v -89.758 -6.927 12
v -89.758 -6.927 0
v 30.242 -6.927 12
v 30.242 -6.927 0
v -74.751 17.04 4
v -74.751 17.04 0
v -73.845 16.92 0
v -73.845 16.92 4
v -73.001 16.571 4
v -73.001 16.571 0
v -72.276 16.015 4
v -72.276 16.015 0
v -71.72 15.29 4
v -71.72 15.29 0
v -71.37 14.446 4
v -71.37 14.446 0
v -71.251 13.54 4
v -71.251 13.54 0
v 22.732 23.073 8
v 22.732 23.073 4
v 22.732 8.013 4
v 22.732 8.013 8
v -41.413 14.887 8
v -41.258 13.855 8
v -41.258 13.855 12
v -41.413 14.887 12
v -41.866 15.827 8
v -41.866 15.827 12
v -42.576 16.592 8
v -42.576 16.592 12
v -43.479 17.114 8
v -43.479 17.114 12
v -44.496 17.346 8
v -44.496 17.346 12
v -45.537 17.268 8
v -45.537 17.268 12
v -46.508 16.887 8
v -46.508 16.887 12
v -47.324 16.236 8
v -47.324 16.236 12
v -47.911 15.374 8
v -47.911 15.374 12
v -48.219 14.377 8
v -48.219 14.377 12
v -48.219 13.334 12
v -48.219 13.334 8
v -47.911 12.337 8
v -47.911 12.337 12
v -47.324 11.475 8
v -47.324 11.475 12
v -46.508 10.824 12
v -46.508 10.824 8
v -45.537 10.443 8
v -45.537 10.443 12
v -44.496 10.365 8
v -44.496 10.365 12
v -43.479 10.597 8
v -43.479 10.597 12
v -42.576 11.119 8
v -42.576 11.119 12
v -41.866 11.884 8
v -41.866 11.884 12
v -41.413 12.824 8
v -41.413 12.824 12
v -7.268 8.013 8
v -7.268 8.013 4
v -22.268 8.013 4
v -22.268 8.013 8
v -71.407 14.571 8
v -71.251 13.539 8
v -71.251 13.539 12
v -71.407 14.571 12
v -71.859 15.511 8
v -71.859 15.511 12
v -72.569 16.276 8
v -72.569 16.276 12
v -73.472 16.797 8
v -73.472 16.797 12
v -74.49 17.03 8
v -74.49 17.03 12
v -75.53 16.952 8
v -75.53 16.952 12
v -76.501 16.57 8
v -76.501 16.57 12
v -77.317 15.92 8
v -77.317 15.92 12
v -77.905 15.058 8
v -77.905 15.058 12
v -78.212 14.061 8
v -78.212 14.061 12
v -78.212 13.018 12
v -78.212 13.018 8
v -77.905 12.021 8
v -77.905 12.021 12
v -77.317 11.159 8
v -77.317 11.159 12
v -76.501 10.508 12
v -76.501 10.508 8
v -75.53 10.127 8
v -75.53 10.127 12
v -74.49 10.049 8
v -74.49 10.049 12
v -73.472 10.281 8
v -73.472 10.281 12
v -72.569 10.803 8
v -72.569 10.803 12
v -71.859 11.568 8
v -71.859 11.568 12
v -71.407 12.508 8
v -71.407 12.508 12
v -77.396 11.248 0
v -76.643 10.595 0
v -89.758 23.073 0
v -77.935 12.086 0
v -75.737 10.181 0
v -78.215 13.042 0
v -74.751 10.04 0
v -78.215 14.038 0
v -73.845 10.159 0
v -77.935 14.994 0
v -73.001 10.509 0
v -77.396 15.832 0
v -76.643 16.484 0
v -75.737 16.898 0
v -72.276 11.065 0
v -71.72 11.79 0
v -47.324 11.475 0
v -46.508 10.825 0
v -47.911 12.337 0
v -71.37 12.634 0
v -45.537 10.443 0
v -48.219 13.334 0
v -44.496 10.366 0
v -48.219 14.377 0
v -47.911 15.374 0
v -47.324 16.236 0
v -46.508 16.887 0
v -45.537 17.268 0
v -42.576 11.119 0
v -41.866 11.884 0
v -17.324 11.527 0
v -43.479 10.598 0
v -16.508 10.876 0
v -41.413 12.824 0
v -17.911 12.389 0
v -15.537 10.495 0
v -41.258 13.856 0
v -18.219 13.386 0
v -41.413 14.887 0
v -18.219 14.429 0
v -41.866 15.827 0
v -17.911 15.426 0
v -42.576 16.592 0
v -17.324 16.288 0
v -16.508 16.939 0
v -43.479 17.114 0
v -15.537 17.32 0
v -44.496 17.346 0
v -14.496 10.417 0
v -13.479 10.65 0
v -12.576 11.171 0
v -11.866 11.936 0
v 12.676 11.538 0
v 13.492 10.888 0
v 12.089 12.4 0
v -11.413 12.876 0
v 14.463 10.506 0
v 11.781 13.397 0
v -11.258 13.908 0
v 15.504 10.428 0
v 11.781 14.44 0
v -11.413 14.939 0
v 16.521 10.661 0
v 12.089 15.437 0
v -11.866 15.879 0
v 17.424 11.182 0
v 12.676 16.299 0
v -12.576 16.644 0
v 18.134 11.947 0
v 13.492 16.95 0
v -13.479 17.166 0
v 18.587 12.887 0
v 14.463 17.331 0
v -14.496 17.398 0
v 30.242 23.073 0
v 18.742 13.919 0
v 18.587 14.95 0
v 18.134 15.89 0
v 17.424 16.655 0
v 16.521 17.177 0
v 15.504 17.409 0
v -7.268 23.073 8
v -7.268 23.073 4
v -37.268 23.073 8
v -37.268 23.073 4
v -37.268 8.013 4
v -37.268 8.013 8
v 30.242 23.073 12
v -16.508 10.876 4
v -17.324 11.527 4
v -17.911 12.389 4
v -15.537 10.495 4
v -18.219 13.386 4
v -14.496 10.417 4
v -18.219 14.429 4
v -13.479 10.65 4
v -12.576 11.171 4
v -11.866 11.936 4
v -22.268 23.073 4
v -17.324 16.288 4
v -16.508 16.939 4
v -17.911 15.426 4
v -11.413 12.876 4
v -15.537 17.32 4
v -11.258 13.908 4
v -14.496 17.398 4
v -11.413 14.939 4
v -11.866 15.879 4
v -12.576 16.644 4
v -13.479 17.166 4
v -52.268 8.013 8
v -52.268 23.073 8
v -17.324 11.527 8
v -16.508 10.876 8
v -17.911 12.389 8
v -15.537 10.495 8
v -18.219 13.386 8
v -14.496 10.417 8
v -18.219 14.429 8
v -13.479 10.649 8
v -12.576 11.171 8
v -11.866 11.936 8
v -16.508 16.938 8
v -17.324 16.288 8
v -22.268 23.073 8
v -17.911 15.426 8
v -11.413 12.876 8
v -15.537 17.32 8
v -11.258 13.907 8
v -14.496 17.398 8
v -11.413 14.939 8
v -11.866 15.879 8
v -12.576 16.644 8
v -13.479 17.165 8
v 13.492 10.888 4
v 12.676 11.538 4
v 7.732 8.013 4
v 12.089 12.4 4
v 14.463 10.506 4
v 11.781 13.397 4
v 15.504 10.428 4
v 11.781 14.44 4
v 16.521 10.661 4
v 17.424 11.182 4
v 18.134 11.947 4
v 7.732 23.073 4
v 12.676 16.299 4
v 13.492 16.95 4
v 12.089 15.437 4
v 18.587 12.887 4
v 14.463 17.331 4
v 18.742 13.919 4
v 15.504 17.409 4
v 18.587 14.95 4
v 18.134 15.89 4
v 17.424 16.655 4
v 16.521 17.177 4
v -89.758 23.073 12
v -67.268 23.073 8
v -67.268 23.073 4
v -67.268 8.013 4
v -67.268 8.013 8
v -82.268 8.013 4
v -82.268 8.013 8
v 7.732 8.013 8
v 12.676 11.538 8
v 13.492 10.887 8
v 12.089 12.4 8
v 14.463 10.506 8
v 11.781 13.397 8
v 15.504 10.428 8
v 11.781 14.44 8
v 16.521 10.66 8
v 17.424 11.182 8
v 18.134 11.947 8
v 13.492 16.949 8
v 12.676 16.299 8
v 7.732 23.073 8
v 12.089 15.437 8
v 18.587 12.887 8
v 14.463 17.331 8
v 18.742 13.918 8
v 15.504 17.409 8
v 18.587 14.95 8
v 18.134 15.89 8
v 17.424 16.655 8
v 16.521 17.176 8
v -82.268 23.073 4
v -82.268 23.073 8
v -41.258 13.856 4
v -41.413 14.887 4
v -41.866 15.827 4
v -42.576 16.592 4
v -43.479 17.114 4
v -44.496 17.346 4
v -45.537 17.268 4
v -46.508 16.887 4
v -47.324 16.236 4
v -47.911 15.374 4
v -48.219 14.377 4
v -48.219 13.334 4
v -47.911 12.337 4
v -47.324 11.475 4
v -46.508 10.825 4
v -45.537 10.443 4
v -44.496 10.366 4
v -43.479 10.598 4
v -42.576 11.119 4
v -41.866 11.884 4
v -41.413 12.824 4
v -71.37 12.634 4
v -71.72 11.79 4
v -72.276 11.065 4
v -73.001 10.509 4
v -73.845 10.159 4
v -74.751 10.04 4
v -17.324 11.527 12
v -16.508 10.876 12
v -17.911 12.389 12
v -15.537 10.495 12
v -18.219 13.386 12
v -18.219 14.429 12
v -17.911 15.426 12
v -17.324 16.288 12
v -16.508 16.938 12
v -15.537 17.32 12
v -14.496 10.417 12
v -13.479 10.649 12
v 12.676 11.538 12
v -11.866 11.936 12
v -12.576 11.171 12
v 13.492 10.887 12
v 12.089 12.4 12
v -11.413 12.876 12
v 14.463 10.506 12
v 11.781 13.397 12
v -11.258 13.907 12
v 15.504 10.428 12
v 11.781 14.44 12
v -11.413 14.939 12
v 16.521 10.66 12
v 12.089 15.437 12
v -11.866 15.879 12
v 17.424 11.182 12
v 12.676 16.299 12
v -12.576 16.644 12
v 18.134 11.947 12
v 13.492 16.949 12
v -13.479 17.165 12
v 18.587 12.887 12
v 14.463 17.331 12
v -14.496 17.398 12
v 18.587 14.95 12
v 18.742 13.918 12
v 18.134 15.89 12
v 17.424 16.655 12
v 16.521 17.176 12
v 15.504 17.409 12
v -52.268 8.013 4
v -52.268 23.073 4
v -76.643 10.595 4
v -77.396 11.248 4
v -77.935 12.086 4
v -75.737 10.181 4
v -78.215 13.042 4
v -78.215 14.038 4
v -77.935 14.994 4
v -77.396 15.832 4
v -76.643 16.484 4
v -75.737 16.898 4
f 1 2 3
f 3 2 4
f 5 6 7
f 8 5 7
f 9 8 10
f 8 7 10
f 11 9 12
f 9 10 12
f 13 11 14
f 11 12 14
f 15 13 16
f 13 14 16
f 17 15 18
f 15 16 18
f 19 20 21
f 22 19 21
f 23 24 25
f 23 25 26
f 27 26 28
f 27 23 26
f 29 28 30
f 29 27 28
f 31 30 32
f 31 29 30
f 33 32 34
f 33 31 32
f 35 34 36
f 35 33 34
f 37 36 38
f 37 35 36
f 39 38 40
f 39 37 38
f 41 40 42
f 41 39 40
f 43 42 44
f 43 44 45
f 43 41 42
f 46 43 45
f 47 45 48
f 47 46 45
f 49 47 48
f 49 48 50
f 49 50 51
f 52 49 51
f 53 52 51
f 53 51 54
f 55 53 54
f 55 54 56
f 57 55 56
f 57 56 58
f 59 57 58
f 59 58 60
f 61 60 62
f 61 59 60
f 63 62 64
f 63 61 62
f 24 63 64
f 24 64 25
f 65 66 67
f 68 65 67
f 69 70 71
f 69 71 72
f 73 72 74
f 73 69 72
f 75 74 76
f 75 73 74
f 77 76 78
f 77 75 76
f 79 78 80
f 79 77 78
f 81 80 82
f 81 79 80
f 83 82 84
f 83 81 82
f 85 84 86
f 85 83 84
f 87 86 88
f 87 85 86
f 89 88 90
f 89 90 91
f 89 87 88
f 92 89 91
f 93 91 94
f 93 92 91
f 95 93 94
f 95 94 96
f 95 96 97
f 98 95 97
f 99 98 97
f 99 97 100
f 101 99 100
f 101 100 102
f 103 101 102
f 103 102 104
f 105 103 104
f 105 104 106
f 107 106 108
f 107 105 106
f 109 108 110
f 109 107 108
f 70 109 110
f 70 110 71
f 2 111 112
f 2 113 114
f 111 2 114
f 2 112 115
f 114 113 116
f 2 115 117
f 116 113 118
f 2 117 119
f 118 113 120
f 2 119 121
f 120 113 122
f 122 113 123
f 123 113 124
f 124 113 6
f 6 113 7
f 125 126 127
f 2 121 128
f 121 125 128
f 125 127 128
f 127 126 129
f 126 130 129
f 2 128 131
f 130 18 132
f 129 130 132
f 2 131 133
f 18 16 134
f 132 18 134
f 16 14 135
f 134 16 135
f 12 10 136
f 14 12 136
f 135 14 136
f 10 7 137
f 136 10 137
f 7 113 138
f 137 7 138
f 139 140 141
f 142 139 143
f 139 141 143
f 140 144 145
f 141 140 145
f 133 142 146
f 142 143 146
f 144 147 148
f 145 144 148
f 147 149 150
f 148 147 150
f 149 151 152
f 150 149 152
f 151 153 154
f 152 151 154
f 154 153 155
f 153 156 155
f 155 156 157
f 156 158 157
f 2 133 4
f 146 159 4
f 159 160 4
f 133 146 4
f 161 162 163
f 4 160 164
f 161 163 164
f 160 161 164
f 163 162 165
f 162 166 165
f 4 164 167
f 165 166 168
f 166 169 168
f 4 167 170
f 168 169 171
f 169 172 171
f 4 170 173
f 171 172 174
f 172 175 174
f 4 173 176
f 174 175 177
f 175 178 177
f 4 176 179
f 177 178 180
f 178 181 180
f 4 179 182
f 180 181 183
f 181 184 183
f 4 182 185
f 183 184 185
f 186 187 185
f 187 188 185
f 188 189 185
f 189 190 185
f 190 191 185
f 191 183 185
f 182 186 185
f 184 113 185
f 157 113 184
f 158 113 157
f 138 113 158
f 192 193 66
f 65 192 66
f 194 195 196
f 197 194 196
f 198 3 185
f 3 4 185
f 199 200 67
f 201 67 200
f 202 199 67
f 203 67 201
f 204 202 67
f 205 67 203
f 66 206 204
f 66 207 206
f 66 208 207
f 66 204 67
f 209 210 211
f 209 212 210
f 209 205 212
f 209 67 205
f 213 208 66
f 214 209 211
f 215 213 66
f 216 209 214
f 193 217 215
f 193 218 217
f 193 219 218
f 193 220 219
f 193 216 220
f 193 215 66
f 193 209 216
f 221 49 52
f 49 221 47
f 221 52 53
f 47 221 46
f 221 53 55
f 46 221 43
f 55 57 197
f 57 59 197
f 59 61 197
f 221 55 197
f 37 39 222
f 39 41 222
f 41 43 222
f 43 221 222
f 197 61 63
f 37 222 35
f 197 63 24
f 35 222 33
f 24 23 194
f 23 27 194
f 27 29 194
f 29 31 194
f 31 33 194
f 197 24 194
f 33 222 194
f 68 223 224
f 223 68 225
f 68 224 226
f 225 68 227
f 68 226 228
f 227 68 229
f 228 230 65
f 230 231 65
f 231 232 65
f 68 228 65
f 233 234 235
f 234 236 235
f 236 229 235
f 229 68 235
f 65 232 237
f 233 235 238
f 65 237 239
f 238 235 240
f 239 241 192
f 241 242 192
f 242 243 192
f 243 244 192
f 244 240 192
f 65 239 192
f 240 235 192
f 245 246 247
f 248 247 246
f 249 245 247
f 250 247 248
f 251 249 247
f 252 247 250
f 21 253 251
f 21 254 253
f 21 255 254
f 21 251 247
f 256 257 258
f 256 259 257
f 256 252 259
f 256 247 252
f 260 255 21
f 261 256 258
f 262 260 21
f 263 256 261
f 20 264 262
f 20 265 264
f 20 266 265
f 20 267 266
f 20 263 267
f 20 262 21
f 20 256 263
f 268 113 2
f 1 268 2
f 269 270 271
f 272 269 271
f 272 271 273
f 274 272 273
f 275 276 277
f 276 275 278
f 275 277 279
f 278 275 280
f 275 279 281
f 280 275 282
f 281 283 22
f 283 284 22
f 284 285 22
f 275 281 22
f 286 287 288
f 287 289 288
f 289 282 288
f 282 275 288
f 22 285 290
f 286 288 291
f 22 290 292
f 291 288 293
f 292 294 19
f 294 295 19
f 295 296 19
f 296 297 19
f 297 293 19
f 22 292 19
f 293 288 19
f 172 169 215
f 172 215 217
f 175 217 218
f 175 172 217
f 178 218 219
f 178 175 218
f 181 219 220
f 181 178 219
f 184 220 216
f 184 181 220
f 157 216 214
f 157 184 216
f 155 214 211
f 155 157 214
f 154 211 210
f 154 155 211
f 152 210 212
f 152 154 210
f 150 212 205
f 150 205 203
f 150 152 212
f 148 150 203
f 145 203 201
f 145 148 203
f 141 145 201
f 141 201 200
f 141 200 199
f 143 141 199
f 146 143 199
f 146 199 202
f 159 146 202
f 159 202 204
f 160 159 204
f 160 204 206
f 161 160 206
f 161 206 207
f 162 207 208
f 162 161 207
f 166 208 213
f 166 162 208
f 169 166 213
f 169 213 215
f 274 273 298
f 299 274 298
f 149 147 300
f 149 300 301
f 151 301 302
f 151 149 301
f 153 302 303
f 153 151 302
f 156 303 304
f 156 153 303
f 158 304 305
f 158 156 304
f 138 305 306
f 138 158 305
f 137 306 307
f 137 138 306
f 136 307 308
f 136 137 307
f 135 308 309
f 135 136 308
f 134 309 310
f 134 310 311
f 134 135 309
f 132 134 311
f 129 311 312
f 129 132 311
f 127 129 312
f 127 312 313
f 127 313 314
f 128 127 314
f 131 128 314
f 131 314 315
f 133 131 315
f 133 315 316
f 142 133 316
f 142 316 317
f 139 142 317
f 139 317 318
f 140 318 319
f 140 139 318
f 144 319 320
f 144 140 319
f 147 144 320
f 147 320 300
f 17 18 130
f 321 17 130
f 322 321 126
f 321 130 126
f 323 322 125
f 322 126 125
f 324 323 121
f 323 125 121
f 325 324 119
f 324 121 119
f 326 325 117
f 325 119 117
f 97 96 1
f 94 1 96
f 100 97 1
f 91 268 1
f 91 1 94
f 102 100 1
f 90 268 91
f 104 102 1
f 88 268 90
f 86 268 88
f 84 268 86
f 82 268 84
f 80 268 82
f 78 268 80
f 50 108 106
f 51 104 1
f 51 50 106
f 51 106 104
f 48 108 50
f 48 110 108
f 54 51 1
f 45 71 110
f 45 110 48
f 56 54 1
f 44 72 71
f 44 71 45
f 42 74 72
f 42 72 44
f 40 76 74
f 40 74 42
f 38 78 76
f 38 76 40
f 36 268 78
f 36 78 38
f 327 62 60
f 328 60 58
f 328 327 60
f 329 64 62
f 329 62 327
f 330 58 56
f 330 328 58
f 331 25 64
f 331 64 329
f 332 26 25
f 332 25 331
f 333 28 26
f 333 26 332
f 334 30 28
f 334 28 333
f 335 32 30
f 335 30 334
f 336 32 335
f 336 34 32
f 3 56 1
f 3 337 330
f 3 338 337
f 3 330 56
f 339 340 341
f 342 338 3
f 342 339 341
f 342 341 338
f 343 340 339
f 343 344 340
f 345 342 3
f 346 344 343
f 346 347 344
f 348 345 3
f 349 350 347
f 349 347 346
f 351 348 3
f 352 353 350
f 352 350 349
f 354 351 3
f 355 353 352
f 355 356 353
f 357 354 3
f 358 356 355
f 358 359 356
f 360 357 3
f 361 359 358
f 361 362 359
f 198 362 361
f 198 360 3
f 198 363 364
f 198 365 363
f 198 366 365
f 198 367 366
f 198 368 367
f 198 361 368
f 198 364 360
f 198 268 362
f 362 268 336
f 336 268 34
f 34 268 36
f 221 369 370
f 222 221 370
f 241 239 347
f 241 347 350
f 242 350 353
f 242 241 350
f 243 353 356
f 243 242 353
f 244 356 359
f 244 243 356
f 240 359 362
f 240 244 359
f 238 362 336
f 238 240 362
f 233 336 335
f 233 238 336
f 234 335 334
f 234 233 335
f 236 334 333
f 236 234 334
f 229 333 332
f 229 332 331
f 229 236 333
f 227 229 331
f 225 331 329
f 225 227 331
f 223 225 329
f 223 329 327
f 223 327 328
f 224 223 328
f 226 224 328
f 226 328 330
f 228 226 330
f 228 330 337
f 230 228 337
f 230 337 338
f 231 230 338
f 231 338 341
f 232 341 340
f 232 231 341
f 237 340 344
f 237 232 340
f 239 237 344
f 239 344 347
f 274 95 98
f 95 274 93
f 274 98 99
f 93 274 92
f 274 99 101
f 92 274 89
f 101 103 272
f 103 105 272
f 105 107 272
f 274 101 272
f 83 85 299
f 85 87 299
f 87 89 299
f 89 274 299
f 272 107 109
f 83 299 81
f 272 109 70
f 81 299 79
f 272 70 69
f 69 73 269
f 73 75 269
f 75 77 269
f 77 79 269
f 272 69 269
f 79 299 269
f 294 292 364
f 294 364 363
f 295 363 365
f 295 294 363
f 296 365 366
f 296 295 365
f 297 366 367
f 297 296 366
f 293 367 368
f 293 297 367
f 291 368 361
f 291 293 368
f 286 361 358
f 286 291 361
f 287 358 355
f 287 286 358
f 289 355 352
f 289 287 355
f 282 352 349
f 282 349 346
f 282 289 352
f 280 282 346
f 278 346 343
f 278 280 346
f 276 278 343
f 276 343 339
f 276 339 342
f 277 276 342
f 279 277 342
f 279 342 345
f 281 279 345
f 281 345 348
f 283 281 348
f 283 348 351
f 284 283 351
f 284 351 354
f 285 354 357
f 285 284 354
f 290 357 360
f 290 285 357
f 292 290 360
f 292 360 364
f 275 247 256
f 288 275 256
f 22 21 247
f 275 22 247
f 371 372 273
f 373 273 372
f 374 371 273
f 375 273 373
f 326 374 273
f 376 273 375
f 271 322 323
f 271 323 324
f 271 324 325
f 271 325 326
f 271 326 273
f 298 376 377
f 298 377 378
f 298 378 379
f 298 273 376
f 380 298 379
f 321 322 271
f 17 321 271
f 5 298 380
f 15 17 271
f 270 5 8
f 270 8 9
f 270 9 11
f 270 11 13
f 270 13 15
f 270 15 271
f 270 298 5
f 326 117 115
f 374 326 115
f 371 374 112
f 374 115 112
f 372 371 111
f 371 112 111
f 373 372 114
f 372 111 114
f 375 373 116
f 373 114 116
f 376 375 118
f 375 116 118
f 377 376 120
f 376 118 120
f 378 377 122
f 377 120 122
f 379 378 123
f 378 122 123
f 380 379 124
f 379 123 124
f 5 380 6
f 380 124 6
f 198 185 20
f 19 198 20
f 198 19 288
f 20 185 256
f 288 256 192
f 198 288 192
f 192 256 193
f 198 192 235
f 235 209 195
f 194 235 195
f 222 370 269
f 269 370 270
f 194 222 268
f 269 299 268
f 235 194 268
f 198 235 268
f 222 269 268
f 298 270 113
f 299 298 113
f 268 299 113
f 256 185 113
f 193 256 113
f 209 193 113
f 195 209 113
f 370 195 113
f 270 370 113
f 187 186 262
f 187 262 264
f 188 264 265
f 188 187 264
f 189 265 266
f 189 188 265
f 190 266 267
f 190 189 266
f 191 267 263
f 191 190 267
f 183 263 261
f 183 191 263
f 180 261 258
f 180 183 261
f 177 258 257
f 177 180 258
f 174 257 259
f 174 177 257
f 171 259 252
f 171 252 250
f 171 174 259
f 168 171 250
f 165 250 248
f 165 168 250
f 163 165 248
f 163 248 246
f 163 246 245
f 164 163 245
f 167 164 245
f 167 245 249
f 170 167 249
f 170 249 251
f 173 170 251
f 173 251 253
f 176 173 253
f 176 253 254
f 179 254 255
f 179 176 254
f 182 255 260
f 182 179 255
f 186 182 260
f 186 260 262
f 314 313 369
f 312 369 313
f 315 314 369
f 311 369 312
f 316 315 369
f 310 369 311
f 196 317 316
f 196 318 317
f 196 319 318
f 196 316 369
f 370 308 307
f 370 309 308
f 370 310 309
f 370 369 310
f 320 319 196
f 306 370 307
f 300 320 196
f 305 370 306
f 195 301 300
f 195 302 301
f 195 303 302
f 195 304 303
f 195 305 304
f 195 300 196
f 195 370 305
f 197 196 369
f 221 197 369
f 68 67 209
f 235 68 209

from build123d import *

# Parameters (mm, degrees)
F0_R     = 3.5
F1_DEPTH = 4
F3_DEPTH = 4
F4_W     = 15
F4_H     = 15.06
F4_R     = 3.5
F5_DEPTH = 4


# Not quite as in the source:
# - a feature names something its author has since deleted; it is built from what else it names


with BuildPart() as f1:
    # F0 (on Top) → F1 (new body)
    with BuildSketch(Plane.XY):
        with BuildLine():
            Line((-74.7510943777, 23.0731565692), (-87.7510943777, 23.0731565692))
            Line((-87.7510943777, 23.0731565692), (-87.7510943777, 19.0731565692))
            Line((-87.7510943777, 19.0731565692), (-87.7510943777, 17.0731565692))
            Line((-87.7510943777, 17.0731565692), (-87.7510943777, -6.9268434308))
            Line((-87.7510943777, -6.9268434308), (-74.7510943777, -6.9268434308))
            Line((-74.7510943777, -6.9268434308), (-74.7510943777, 10.0396581329))
            ThreePointArc((-74.7510943777, 10.0396581329), (-78.2510943777, 13.5396581329), (-74.7510943777, 17.0396581329))
            Line((-74.7510943777, 17.0396581329), (-74.7510943777, 23.0731565692))
        make_face()
        Polygon((-87.7510943777, 19.0731565692), (-87.7510943777, 23.0731565692), (-89.7579597334, 23.0731565692), (-89.7579597334, -6.9268434308), (-87.7510943777, -6.9268434308), (-87.7510943777, 17.0731565692), align=None)
        with BuildLine():
            Line((30.2420402666, 23.0731565692), (-74.7510943777, 23.0731565692))
            Line((-74.7510943777, 23.0731565692), (-74.7510943777, 17.0396581329))
            ThreePointArc((-74.7510943777, 17.0396581329), (-72.2762206436, 16.0145318671), (-71.2510943777, 13.5396581329))
            ThreePointArc((-71.2510943777, 13.5396581329), (-72.2762206436, 11.0647843988), (-74.7510943777, 10.0396581329))
            Line((-74.7510943777, 10.0396581329), (-74.7510943777, -6.9268434308))
            Line((-74.7510943777, -6.9268434308), (30.2420402666, -6.9268434308))
            Line((30.2420402666, -6.9268434308), (30.2420402666, 23.0731565692))
        make_face()
        with Locations((-44.7579597334, 13.8557466809)):
            Circle(F0_R, mode=Mode.SUBTRACT)
        with Locations((-14.7579597334, 13.9075608123)):
            Circle(F0_R, mode=Mode.SUBTRACT)
        with Locations((15.2420402666, 13.9186258558)):
            Circle(F0_R, mode=Mode.SUBTRACT)
    extrude(amount=F1_DEPTH)

    # F2 (on face) → F3 (join)
    with BuildSketch(Plane.XY.offset(4)):
        Polygon((30.2420402666, 23.0731565692), (30.2320402666, 23.0731565692), (30.2420402666, -6.9268434308), align=None)
        Polygon((30.2420402666, -6.9268434308), (30.2320402666, 23.0731565692), (22.7320402666, 23.0731565692), (22.7320402666, 8.0131565692), (7.7320402666, 8.0131565692), (7.7320402666, 23.0731565692), (-7.2679597334, 23.0731565692), (-7.2679597334, 8.0131565692), (-22.2679597334, 8.0131565692), (-22.2679597334, 23.0731565692), (-37.2679597334, 23.0731565692), (-37.2679597334, 8.0131565692), (-52.2679597334, 8.0131565692), (-52.2679597334, 23.0731565692), (-67.2679597334, 23.0731565692), (-67.2679597334, 8.0131565692), (-82.2679597334, 8.0131565692), (-82.2679597334, 23.0731565692), (-89.7579597334, 23.0731565692), (-89.7579597334, -6.9268434308), align=None)
    extrude(amount=F3_DEPTH)

    # F4 (on face) → F5 (join)
    with BuildSketch(Plane.XY.offset(8)):
        Polygon((-82.2679597334, 23.0731565692), (-89.7579597334, 23.0731565692), (-89.7579597334, -6.9268434308), (30.2420402666, -6.9268434308), (30.2420402666, 23.0731565692), (22.7320402666, 23.0731565692), (22.7320402666, 8.0131565692), (7.7320402666, 8.0131565692), (7.7320402666, 23.0731565692), (-7.2679597334, 23.0731565692), (-7.2679597334, 8.0131565692), (-22.2679597334, 8.0131565692), (-22.2679597334, 23.0731565692), (-37.2679597334, 23.0731565692), (-37.2679597334, 8.0131565692), (-52.2679597334, 8.0131565692), (-52.2679597334, 23.0731565692), (-67.2679597334, 23.0731565692), (-67.2679597334, 8.0131565692), (-82.2679597334, 8.0131565692), align=None)
        with Locations((-44.7679597334, 15.5431565692)):
            Rectangle(F4_W, F4_H)
        with Locations((-44.7580007362, 13.8554783896)):
            Circle(F4_R, mode=Mode.SUBTRACT)
        with Locations((-14.7679597334, 15.5431565692)):
            Rectangle(F4_W, F4_H)
        with Locations((-14.7580007362, 13.907292521)):
            Circle(F4_R, mode=Mode.SUBTRACT)
        with Locations((15.2320402666, 15.5431565692)):
            Rectangle(F4_W, F4_H)
        with Locations((15.2419992638, 13.9183575645)):
            Circle(F4_R, mode=Mode.SUBTRACT)
        with Locations((-74.7679597334, 15.5431565692)):
            Rectangle(F4_W, F4_H)
        with Locations((-74.7511353805, 13.5393898416)):
            Circle(F4_R, mode=Mode.SUBTRACT)
    extrude(amount=F5_DEPTH)


solid = f1.part
